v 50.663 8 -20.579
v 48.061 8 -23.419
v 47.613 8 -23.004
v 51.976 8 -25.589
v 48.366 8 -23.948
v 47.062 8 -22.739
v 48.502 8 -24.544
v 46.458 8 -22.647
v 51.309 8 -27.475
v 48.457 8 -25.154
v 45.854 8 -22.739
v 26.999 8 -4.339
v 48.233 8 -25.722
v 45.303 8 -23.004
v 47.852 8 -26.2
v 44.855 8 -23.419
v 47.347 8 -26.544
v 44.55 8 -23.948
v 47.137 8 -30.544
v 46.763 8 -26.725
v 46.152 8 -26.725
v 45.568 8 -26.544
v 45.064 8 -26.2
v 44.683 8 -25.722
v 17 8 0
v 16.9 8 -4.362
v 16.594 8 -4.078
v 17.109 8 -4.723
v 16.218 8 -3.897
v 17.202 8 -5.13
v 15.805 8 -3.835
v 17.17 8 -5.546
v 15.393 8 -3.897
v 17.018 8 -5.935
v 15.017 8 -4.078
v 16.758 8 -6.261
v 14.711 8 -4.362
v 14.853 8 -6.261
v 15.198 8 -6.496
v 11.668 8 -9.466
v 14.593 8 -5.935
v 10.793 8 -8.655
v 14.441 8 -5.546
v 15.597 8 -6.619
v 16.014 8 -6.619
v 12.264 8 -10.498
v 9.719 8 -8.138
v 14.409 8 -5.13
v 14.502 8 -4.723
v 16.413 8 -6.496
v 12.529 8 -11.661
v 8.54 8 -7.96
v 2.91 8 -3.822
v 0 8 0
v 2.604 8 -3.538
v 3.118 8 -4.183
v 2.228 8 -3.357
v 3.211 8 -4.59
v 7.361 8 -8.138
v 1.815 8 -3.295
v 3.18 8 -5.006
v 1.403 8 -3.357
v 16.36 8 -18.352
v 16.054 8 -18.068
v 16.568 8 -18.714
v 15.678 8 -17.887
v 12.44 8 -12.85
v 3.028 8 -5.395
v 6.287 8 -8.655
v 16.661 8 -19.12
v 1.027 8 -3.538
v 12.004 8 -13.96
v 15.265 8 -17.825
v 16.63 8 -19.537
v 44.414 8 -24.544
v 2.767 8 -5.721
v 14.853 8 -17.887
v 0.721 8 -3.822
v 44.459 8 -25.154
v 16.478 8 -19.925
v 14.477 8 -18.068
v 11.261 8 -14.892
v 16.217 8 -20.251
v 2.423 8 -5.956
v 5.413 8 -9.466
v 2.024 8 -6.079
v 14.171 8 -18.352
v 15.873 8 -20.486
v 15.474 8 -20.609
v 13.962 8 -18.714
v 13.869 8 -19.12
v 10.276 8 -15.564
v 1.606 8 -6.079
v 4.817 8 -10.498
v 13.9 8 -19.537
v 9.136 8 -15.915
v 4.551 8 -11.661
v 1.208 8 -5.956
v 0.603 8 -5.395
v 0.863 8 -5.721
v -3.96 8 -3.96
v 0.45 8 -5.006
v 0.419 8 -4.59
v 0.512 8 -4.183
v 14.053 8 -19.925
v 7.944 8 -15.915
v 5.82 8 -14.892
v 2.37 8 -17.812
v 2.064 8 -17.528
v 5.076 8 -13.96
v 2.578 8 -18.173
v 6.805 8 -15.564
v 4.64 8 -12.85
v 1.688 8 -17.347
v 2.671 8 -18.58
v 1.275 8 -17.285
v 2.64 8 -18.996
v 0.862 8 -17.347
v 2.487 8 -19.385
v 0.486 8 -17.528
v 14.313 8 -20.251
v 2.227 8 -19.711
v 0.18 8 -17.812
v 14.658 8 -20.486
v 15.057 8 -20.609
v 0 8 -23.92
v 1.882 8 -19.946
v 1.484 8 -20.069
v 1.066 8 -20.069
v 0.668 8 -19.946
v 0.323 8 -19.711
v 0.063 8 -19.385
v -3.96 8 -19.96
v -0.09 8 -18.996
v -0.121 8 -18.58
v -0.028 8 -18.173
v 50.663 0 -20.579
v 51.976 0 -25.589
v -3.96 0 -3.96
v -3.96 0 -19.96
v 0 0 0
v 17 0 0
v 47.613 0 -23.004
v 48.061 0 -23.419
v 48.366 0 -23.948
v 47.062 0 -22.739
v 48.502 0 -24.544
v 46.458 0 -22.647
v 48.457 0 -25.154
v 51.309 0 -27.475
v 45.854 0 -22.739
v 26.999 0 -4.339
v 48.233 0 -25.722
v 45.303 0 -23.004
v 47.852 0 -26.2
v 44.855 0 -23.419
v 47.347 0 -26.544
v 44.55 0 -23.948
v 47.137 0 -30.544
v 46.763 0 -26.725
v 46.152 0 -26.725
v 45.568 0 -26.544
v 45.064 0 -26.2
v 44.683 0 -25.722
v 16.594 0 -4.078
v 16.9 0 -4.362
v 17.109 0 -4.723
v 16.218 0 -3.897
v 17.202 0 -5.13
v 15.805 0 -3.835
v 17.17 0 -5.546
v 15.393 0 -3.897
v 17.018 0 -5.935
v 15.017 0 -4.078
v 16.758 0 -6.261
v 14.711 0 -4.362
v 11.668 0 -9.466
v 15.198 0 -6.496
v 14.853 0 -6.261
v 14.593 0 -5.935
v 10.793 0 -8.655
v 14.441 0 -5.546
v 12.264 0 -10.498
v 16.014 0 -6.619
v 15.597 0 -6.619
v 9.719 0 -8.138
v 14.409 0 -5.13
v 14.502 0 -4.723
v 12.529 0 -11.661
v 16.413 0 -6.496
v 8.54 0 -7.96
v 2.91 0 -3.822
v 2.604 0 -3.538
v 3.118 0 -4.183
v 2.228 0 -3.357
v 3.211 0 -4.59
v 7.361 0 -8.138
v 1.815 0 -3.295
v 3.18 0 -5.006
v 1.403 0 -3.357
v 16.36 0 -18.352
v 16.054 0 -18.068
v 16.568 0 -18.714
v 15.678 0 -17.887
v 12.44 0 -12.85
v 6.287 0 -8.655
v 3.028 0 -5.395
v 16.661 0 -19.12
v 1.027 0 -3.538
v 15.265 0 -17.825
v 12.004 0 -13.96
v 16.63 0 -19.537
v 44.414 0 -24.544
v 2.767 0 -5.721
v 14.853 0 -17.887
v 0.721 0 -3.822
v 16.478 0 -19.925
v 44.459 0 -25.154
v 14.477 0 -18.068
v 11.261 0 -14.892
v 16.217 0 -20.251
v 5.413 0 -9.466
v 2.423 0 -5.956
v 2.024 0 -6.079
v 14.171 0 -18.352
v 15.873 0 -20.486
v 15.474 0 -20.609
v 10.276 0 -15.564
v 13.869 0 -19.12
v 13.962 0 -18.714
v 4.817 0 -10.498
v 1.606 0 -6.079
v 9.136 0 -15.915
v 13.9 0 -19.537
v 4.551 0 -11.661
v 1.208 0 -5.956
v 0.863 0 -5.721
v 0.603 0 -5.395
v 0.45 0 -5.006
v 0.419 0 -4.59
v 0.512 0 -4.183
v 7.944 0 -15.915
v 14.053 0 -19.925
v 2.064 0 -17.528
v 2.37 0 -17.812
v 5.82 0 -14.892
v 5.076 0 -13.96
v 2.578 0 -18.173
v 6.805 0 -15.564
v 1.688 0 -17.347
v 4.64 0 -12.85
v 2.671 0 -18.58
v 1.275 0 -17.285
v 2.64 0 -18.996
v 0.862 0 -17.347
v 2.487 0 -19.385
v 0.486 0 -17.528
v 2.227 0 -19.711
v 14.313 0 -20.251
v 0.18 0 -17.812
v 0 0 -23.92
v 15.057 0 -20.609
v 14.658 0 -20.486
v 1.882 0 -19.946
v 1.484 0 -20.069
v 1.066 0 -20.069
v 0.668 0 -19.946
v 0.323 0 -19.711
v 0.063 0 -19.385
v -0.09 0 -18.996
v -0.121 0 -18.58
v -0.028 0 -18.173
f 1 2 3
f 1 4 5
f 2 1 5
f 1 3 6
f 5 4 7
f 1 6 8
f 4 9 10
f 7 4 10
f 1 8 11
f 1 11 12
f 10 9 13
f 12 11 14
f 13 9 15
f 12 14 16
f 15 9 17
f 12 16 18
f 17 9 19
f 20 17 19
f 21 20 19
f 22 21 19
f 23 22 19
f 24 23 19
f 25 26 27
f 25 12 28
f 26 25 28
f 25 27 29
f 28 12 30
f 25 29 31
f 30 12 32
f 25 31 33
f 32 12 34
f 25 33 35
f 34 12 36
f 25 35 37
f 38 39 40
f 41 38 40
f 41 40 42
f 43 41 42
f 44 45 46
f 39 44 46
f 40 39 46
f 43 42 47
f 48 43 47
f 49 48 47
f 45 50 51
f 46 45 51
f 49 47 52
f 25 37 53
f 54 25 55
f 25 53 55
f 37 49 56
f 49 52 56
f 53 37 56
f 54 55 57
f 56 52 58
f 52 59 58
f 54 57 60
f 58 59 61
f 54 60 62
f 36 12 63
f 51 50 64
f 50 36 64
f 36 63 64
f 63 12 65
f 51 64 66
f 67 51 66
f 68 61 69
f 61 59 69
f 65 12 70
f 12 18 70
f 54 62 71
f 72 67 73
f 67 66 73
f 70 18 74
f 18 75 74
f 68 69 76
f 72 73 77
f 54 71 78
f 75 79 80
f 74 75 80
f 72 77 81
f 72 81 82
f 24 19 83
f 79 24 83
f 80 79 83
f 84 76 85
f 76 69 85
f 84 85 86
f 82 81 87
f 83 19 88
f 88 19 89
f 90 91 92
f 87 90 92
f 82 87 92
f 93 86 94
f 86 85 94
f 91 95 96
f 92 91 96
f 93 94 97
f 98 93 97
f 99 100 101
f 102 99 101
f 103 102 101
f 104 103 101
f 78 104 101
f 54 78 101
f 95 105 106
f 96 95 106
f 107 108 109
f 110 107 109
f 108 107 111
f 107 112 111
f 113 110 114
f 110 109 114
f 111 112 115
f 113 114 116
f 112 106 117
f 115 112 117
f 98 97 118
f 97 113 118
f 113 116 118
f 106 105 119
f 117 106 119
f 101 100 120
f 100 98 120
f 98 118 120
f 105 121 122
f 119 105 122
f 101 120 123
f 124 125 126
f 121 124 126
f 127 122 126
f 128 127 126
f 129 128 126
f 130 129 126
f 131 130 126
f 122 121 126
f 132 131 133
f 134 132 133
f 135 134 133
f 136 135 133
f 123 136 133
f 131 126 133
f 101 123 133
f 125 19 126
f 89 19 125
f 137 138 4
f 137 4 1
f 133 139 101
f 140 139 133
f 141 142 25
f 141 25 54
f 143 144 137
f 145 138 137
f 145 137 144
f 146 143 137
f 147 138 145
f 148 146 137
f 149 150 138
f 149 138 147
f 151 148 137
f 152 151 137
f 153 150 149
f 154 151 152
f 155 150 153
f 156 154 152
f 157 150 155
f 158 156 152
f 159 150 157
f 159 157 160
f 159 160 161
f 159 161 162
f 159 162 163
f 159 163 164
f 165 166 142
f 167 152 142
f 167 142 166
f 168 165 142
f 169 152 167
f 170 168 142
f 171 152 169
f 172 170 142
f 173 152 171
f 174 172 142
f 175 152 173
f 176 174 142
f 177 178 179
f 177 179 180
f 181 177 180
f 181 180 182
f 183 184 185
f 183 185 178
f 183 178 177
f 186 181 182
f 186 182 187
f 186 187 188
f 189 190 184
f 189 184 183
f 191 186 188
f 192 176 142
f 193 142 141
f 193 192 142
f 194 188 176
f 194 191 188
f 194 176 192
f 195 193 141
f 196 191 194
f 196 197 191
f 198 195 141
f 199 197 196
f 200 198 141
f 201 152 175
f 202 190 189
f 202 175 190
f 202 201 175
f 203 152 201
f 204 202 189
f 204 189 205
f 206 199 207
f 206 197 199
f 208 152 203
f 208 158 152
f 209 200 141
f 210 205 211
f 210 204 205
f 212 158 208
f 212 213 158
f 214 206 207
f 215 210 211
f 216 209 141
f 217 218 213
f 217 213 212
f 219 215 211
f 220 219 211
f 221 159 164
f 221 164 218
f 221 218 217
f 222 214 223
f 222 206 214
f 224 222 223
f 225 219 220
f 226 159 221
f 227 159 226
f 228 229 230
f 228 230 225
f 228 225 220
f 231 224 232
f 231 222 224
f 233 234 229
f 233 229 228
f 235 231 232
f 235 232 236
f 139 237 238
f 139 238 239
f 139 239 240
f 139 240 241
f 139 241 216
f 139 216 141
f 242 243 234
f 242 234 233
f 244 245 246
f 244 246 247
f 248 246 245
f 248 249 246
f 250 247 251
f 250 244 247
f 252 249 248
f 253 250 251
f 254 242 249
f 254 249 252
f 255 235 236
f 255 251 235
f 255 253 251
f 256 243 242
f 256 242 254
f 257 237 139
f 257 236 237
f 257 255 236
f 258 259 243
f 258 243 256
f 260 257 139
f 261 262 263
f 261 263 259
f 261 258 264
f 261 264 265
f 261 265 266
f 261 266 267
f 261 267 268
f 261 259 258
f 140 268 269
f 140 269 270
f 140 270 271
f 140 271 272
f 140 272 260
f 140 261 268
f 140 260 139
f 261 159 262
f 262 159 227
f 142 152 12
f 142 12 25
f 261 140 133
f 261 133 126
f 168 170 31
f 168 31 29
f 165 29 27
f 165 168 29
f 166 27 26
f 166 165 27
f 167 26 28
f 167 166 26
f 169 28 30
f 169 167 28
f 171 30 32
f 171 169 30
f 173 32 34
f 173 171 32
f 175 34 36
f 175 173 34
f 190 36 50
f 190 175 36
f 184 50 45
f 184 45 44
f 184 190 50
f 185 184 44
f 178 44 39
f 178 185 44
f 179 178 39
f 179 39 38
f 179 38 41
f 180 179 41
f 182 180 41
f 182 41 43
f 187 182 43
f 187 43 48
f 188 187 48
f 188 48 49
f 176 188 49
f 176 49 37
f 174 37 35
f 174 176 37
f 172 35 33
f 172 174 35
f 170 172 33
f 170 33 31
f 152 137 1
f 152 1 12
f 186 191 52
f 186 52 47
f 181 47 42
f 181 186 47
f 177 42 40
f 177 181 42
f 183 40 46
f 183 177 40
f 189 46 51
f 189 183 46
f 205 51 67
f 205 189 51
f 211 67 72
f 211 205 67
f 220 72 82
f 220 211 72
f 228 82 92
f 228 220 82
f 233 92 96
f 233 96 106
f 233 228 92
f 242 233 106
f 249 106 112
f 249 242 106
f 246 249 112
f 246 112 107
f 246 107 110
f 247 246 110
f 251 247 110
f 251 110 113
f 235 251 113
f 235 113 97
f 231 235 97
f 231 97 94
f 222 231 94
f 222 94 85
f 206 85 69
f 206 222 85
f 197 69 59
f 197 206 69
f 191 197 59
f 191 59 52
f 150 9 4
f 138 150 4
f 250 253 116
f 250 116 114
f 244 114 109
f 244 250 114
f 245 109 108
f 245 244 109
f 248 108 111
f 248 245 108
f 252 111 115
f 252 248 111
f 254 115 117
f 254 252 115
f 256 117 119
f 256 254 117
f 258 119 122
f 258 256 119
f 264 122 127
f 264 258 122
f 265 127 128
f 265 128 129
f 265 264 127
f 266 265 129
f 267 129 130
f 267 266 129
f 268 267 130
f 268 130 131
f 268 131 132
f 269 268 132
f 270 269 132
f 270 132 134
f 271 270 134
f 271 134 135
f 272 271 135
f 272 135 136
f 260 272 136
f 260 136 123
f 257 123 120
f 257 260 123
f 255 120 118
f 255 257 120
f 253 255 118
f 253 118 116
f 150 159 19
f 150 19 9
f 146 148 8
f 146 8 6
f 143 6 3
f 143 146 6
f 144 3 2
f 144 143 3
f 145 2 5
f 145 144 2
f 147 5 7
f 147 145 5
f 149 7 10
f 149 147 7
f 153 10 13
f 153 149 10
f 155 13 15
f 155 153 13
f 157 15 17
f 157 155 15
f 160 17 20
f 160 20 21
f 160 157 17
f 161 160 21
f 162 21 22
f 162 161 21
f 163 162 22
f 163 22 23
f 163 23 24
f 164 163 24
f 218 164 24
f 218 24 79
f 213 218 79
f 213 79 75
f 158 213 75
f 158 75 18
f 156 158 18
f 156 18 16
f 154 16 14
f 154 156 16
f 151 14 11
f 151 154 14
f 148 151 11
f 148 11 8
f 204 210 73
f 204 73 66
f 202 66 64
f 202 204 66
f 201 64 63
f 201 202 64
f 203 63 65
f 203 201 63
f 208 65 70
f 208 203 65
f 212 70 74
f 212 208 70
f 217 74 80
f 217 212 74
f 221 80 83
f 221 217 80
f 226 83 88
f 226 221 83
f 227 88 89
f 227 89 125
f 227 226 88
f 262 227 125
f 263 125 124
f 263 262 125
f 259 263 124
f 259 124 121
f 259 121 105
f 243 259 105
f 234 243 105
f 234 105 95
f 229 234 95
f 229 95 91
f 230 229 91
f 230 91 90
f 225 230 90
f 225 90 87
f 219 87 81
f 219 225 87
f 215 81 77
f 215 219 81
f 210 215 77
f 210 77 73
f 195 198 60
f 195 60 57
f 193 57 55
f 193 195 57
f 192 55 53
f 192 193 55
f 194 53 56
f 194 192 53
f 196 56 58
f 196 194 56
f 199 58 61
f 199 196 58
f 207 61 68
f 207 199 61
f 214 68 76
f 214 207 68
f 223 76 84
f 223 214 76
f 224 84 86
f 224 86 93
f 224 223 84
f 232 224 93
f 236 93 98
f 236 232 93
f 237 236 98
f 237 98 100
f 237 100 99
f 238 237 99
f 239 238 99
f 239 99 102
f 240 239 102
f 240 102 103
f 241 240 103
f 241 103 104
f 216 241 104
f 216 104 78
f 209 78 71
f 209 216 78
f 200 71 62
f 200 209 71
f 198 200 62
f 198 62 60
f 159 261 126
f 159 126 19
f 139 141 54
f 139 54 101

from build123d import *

# Parameters (mm, degrees)
SKETCH_1_R      = 4
SKETCH_1_R_2    = 2.05
SKETCH_1_R_3    = 1.4
EXTRUDE_1_DEPTH = 8


with BuildPart() as part:
    # 草图1 → 凸台-拉伸1 (new body)
    with BuildSketch(Plane(origin=(0, 0, 0), x_dir=(1, 0, 0), z_dir=(0, 1, 0))):
        Polygon((0, 0), (-3.959797975, 3.959797975), (-3.959797975, 19.959797975), (0, 23.919595949), (47.136760072, 30.544235555), (51.309361757, 27.474741267), (51.976478872, 25.589282502), (50.662813892, 20.578625428), (26.998999911, 4.339354882), (17, 0), align=None)
        with Locations(Location((8.540202025, 11.959797975, 0), (0, 0, 270))):
            Circle(SKETCH_1_R, mode=Mode.SUBTRACT)
        with Locations(Location((46.457908711, 24.697439818, 0), (0, 0, 270))):
            Circle(SKETCH_1_R_2, mode=Mode.SUBTRACT)
        with Locations(Location((1.274956594, 18.684841381, 0), (0, 0, 270))):
            Circle(SKETCH_1_R_3, mode=Mode.SUBTRACT)
        with Locations(Location((15.265245432, 19.225043406, 0), (0, 0, 270))):
            Circle(SKETCH_1_R_3, mode=Mode.SUBTRACT)
        with Locations(Location((15.805447457, 5.234754568, 0), (0, 0, 270))):
            Circle(SKETCH_1_R_3, mode=Mode.SUBTRACT)
        with Locations(Location((1.815158619, 4.694552543, 0), (0, 0, 270))):
            Circle(SKETCH_1_R_3, mode=Mode.SUBTRACT)
    extrude(amount=EXTRUDE_1_DEPTH)


solid = part.part
